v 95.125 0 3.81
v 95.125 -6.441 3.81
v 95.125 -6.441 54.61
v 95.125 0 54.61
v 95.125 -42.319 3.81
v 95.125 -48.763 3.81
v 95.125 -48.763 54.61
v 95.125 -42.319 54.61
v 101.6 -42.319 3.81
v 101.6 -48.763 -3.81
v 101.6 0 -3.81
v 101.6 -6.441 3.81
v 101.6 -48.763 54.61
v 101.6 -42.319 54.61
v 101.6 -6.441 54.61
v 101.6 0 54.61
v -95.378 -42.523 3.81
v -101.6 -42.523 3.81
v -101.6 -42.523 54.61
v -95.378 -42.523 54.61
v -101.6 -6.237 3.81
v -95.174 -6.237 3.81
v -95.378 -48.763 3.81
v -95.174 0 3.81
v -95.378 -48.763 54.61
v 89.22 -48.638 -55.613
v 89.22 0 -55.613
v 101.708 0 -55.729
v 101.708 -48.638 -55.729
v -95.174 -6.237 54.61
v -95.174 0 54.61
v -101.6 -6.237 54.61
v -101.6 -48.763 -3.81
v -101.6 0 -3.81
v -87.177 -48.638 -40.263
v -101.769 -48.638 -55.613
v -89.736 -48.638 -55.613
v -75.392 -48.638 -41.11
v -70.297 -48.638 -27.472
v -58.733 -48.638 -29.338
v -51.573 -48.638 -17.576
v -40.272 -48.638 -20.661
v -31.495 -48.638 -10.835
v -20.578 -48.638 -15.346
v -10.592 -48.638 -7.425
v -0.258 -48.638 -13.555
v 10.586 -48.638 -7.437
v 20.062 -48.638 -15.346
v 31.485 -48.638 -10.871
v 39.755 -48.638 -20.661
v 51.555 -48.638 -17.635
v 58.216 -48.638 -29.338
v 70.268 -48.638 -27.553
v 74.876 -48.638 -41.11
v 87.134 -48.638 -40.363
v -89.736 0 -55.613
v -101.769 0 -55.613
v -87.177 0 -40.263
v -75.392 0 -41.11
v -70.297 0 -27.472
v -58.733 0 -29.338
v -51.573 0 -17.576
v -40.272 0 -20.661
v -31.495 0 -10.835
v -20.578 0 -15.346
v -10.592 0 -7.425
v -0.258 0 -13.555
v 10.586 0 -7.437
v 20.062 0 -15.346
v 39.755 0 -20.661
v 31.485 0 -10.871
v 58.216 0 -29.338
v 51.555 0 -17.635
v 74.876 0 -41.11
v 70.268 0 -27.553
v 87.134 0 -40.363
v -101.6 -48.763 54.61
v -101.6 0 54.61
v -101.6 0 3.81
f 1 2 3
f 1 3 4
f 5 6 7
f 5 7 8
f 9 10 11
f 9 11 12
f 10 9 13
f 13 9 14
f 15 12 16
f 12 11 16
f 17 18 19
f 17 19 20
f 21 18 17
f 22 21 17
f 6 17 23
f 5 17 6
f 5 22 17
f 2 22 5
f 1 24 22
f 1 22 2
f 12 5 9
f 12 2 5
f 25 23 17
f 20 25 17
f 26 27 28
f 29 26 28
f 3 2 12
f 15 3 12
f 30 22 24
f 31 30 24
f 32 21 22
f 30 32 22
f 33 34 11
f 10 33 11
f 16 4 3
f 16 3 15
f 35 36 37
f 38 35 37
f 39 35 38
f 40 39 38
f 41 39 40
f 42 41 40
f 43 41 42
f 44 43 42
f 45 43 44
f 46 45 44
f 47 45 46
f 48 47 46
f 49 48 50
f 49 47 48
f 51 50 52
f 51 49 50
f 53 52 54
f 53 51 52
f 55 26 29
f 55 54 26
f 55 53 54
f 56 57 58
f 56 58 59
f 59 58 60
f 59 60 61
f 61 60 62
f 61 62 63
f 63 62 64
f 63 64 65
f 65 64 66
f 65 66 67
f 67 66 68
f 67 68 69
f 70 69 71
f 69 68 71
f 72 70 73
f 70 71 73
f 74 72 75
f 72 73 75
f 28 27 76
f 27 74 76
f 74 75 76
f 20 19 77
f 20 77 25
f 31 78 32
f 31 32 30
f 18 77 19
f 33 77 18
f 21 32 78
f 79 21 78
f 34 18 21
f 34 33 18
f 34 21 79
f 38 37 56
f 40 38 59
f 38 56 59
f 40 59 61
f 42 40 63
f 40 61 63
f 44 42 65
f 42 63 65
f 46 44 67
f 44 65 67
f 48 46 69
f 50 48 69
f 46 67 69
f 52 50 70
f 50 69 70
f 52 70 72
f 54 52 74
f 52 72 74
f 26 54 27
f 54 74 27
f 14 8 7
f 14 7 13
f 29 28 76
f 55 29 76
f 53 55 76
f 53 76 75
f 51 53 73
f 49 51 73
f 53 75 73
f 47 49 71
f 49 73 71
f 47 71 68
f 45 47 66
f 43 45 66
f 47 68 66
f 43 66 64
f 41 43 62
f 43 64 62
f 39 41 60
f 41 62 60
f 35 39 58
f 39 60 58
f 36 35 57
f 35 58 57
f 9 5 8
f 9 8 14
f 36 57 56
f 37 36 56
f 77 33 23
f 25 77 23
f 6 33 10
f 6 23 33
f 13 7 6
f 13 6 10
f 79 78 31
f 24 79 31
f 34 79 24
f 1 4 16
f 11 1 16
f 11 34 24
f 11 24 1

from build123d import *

# Parameters (mm, degrees)
F0_W     = 203.2
F0_H     = 7.62
F1_DEPTH = 48.76292
F2_W     = 6.4262472153
F2_H     = 6.2367809005
F2_W_2   = 6.2223918796
F2_H_2   = 6.2395843345
F2_W_3   = 6.4746759892
F2_H_3   = 6.4406376332
F2_H_4   = 6.4434433955
F3_DEPTH = 50.8
F5_DEPTH = 48.63821


# Not quite as in the source:
# - the program builds the solid bodies; features that only make, move or delete a surface that nothing else refers to are left out


with BuildPart() as f1:
    # F0 (on Front) → F1 (new body)
    with BuildSketch(Plane.XZ):
        Rectangle(F0_W, F0_H)
    extrude(amount=F1_DEPTH)

    # F2 (on face) → F3 (join)
    with BuildSketch(Plane.XY.offset(3.81)):
        with Locations((-98.3868763924, -3.1183904503)):
            Rectangle(F2_W, F2_H)
        with Locations((-98.4888040602, -45.6431278327)):
            Rectangle(F2_W_2, F2_H_2)
        with Locations((98.3626620054, -3.2203188166)):
            Rectangle(F2_W_3, F2_H_3)
        with Locations((98.3626620054, -45.5411983022)):
            Rectangle(F2_W_3, F2_H_4)
    extrude(amount=F3_DEPTH)


with BuildPart() as f5:
    # F4 (on Front) → F5 (new body)
    with BuildSketch(Plane.XZ):
        with BuildLine():
            Line((89.2202242982, -55.6125417352), (101.708002892, -55.7293946085))
            ThreePointArc((101.708002892, -55.7293946085), (-0.0027350897, -7.001500307), (-101.7693728209, -55.6125417352))
            Line((-101.7693728209, -55.6125417352), (-89.7364146949, -55.6125417352))
            ThreePointArc((-89.7364146949, -55.6125417352), (-0.2580951983, -13.5554328116), (89.2202242982, -55.6125417352))
        make_face()
    extrude(amount=F5_DEPTH)


solid = Compound([f1.part, f5.part])
